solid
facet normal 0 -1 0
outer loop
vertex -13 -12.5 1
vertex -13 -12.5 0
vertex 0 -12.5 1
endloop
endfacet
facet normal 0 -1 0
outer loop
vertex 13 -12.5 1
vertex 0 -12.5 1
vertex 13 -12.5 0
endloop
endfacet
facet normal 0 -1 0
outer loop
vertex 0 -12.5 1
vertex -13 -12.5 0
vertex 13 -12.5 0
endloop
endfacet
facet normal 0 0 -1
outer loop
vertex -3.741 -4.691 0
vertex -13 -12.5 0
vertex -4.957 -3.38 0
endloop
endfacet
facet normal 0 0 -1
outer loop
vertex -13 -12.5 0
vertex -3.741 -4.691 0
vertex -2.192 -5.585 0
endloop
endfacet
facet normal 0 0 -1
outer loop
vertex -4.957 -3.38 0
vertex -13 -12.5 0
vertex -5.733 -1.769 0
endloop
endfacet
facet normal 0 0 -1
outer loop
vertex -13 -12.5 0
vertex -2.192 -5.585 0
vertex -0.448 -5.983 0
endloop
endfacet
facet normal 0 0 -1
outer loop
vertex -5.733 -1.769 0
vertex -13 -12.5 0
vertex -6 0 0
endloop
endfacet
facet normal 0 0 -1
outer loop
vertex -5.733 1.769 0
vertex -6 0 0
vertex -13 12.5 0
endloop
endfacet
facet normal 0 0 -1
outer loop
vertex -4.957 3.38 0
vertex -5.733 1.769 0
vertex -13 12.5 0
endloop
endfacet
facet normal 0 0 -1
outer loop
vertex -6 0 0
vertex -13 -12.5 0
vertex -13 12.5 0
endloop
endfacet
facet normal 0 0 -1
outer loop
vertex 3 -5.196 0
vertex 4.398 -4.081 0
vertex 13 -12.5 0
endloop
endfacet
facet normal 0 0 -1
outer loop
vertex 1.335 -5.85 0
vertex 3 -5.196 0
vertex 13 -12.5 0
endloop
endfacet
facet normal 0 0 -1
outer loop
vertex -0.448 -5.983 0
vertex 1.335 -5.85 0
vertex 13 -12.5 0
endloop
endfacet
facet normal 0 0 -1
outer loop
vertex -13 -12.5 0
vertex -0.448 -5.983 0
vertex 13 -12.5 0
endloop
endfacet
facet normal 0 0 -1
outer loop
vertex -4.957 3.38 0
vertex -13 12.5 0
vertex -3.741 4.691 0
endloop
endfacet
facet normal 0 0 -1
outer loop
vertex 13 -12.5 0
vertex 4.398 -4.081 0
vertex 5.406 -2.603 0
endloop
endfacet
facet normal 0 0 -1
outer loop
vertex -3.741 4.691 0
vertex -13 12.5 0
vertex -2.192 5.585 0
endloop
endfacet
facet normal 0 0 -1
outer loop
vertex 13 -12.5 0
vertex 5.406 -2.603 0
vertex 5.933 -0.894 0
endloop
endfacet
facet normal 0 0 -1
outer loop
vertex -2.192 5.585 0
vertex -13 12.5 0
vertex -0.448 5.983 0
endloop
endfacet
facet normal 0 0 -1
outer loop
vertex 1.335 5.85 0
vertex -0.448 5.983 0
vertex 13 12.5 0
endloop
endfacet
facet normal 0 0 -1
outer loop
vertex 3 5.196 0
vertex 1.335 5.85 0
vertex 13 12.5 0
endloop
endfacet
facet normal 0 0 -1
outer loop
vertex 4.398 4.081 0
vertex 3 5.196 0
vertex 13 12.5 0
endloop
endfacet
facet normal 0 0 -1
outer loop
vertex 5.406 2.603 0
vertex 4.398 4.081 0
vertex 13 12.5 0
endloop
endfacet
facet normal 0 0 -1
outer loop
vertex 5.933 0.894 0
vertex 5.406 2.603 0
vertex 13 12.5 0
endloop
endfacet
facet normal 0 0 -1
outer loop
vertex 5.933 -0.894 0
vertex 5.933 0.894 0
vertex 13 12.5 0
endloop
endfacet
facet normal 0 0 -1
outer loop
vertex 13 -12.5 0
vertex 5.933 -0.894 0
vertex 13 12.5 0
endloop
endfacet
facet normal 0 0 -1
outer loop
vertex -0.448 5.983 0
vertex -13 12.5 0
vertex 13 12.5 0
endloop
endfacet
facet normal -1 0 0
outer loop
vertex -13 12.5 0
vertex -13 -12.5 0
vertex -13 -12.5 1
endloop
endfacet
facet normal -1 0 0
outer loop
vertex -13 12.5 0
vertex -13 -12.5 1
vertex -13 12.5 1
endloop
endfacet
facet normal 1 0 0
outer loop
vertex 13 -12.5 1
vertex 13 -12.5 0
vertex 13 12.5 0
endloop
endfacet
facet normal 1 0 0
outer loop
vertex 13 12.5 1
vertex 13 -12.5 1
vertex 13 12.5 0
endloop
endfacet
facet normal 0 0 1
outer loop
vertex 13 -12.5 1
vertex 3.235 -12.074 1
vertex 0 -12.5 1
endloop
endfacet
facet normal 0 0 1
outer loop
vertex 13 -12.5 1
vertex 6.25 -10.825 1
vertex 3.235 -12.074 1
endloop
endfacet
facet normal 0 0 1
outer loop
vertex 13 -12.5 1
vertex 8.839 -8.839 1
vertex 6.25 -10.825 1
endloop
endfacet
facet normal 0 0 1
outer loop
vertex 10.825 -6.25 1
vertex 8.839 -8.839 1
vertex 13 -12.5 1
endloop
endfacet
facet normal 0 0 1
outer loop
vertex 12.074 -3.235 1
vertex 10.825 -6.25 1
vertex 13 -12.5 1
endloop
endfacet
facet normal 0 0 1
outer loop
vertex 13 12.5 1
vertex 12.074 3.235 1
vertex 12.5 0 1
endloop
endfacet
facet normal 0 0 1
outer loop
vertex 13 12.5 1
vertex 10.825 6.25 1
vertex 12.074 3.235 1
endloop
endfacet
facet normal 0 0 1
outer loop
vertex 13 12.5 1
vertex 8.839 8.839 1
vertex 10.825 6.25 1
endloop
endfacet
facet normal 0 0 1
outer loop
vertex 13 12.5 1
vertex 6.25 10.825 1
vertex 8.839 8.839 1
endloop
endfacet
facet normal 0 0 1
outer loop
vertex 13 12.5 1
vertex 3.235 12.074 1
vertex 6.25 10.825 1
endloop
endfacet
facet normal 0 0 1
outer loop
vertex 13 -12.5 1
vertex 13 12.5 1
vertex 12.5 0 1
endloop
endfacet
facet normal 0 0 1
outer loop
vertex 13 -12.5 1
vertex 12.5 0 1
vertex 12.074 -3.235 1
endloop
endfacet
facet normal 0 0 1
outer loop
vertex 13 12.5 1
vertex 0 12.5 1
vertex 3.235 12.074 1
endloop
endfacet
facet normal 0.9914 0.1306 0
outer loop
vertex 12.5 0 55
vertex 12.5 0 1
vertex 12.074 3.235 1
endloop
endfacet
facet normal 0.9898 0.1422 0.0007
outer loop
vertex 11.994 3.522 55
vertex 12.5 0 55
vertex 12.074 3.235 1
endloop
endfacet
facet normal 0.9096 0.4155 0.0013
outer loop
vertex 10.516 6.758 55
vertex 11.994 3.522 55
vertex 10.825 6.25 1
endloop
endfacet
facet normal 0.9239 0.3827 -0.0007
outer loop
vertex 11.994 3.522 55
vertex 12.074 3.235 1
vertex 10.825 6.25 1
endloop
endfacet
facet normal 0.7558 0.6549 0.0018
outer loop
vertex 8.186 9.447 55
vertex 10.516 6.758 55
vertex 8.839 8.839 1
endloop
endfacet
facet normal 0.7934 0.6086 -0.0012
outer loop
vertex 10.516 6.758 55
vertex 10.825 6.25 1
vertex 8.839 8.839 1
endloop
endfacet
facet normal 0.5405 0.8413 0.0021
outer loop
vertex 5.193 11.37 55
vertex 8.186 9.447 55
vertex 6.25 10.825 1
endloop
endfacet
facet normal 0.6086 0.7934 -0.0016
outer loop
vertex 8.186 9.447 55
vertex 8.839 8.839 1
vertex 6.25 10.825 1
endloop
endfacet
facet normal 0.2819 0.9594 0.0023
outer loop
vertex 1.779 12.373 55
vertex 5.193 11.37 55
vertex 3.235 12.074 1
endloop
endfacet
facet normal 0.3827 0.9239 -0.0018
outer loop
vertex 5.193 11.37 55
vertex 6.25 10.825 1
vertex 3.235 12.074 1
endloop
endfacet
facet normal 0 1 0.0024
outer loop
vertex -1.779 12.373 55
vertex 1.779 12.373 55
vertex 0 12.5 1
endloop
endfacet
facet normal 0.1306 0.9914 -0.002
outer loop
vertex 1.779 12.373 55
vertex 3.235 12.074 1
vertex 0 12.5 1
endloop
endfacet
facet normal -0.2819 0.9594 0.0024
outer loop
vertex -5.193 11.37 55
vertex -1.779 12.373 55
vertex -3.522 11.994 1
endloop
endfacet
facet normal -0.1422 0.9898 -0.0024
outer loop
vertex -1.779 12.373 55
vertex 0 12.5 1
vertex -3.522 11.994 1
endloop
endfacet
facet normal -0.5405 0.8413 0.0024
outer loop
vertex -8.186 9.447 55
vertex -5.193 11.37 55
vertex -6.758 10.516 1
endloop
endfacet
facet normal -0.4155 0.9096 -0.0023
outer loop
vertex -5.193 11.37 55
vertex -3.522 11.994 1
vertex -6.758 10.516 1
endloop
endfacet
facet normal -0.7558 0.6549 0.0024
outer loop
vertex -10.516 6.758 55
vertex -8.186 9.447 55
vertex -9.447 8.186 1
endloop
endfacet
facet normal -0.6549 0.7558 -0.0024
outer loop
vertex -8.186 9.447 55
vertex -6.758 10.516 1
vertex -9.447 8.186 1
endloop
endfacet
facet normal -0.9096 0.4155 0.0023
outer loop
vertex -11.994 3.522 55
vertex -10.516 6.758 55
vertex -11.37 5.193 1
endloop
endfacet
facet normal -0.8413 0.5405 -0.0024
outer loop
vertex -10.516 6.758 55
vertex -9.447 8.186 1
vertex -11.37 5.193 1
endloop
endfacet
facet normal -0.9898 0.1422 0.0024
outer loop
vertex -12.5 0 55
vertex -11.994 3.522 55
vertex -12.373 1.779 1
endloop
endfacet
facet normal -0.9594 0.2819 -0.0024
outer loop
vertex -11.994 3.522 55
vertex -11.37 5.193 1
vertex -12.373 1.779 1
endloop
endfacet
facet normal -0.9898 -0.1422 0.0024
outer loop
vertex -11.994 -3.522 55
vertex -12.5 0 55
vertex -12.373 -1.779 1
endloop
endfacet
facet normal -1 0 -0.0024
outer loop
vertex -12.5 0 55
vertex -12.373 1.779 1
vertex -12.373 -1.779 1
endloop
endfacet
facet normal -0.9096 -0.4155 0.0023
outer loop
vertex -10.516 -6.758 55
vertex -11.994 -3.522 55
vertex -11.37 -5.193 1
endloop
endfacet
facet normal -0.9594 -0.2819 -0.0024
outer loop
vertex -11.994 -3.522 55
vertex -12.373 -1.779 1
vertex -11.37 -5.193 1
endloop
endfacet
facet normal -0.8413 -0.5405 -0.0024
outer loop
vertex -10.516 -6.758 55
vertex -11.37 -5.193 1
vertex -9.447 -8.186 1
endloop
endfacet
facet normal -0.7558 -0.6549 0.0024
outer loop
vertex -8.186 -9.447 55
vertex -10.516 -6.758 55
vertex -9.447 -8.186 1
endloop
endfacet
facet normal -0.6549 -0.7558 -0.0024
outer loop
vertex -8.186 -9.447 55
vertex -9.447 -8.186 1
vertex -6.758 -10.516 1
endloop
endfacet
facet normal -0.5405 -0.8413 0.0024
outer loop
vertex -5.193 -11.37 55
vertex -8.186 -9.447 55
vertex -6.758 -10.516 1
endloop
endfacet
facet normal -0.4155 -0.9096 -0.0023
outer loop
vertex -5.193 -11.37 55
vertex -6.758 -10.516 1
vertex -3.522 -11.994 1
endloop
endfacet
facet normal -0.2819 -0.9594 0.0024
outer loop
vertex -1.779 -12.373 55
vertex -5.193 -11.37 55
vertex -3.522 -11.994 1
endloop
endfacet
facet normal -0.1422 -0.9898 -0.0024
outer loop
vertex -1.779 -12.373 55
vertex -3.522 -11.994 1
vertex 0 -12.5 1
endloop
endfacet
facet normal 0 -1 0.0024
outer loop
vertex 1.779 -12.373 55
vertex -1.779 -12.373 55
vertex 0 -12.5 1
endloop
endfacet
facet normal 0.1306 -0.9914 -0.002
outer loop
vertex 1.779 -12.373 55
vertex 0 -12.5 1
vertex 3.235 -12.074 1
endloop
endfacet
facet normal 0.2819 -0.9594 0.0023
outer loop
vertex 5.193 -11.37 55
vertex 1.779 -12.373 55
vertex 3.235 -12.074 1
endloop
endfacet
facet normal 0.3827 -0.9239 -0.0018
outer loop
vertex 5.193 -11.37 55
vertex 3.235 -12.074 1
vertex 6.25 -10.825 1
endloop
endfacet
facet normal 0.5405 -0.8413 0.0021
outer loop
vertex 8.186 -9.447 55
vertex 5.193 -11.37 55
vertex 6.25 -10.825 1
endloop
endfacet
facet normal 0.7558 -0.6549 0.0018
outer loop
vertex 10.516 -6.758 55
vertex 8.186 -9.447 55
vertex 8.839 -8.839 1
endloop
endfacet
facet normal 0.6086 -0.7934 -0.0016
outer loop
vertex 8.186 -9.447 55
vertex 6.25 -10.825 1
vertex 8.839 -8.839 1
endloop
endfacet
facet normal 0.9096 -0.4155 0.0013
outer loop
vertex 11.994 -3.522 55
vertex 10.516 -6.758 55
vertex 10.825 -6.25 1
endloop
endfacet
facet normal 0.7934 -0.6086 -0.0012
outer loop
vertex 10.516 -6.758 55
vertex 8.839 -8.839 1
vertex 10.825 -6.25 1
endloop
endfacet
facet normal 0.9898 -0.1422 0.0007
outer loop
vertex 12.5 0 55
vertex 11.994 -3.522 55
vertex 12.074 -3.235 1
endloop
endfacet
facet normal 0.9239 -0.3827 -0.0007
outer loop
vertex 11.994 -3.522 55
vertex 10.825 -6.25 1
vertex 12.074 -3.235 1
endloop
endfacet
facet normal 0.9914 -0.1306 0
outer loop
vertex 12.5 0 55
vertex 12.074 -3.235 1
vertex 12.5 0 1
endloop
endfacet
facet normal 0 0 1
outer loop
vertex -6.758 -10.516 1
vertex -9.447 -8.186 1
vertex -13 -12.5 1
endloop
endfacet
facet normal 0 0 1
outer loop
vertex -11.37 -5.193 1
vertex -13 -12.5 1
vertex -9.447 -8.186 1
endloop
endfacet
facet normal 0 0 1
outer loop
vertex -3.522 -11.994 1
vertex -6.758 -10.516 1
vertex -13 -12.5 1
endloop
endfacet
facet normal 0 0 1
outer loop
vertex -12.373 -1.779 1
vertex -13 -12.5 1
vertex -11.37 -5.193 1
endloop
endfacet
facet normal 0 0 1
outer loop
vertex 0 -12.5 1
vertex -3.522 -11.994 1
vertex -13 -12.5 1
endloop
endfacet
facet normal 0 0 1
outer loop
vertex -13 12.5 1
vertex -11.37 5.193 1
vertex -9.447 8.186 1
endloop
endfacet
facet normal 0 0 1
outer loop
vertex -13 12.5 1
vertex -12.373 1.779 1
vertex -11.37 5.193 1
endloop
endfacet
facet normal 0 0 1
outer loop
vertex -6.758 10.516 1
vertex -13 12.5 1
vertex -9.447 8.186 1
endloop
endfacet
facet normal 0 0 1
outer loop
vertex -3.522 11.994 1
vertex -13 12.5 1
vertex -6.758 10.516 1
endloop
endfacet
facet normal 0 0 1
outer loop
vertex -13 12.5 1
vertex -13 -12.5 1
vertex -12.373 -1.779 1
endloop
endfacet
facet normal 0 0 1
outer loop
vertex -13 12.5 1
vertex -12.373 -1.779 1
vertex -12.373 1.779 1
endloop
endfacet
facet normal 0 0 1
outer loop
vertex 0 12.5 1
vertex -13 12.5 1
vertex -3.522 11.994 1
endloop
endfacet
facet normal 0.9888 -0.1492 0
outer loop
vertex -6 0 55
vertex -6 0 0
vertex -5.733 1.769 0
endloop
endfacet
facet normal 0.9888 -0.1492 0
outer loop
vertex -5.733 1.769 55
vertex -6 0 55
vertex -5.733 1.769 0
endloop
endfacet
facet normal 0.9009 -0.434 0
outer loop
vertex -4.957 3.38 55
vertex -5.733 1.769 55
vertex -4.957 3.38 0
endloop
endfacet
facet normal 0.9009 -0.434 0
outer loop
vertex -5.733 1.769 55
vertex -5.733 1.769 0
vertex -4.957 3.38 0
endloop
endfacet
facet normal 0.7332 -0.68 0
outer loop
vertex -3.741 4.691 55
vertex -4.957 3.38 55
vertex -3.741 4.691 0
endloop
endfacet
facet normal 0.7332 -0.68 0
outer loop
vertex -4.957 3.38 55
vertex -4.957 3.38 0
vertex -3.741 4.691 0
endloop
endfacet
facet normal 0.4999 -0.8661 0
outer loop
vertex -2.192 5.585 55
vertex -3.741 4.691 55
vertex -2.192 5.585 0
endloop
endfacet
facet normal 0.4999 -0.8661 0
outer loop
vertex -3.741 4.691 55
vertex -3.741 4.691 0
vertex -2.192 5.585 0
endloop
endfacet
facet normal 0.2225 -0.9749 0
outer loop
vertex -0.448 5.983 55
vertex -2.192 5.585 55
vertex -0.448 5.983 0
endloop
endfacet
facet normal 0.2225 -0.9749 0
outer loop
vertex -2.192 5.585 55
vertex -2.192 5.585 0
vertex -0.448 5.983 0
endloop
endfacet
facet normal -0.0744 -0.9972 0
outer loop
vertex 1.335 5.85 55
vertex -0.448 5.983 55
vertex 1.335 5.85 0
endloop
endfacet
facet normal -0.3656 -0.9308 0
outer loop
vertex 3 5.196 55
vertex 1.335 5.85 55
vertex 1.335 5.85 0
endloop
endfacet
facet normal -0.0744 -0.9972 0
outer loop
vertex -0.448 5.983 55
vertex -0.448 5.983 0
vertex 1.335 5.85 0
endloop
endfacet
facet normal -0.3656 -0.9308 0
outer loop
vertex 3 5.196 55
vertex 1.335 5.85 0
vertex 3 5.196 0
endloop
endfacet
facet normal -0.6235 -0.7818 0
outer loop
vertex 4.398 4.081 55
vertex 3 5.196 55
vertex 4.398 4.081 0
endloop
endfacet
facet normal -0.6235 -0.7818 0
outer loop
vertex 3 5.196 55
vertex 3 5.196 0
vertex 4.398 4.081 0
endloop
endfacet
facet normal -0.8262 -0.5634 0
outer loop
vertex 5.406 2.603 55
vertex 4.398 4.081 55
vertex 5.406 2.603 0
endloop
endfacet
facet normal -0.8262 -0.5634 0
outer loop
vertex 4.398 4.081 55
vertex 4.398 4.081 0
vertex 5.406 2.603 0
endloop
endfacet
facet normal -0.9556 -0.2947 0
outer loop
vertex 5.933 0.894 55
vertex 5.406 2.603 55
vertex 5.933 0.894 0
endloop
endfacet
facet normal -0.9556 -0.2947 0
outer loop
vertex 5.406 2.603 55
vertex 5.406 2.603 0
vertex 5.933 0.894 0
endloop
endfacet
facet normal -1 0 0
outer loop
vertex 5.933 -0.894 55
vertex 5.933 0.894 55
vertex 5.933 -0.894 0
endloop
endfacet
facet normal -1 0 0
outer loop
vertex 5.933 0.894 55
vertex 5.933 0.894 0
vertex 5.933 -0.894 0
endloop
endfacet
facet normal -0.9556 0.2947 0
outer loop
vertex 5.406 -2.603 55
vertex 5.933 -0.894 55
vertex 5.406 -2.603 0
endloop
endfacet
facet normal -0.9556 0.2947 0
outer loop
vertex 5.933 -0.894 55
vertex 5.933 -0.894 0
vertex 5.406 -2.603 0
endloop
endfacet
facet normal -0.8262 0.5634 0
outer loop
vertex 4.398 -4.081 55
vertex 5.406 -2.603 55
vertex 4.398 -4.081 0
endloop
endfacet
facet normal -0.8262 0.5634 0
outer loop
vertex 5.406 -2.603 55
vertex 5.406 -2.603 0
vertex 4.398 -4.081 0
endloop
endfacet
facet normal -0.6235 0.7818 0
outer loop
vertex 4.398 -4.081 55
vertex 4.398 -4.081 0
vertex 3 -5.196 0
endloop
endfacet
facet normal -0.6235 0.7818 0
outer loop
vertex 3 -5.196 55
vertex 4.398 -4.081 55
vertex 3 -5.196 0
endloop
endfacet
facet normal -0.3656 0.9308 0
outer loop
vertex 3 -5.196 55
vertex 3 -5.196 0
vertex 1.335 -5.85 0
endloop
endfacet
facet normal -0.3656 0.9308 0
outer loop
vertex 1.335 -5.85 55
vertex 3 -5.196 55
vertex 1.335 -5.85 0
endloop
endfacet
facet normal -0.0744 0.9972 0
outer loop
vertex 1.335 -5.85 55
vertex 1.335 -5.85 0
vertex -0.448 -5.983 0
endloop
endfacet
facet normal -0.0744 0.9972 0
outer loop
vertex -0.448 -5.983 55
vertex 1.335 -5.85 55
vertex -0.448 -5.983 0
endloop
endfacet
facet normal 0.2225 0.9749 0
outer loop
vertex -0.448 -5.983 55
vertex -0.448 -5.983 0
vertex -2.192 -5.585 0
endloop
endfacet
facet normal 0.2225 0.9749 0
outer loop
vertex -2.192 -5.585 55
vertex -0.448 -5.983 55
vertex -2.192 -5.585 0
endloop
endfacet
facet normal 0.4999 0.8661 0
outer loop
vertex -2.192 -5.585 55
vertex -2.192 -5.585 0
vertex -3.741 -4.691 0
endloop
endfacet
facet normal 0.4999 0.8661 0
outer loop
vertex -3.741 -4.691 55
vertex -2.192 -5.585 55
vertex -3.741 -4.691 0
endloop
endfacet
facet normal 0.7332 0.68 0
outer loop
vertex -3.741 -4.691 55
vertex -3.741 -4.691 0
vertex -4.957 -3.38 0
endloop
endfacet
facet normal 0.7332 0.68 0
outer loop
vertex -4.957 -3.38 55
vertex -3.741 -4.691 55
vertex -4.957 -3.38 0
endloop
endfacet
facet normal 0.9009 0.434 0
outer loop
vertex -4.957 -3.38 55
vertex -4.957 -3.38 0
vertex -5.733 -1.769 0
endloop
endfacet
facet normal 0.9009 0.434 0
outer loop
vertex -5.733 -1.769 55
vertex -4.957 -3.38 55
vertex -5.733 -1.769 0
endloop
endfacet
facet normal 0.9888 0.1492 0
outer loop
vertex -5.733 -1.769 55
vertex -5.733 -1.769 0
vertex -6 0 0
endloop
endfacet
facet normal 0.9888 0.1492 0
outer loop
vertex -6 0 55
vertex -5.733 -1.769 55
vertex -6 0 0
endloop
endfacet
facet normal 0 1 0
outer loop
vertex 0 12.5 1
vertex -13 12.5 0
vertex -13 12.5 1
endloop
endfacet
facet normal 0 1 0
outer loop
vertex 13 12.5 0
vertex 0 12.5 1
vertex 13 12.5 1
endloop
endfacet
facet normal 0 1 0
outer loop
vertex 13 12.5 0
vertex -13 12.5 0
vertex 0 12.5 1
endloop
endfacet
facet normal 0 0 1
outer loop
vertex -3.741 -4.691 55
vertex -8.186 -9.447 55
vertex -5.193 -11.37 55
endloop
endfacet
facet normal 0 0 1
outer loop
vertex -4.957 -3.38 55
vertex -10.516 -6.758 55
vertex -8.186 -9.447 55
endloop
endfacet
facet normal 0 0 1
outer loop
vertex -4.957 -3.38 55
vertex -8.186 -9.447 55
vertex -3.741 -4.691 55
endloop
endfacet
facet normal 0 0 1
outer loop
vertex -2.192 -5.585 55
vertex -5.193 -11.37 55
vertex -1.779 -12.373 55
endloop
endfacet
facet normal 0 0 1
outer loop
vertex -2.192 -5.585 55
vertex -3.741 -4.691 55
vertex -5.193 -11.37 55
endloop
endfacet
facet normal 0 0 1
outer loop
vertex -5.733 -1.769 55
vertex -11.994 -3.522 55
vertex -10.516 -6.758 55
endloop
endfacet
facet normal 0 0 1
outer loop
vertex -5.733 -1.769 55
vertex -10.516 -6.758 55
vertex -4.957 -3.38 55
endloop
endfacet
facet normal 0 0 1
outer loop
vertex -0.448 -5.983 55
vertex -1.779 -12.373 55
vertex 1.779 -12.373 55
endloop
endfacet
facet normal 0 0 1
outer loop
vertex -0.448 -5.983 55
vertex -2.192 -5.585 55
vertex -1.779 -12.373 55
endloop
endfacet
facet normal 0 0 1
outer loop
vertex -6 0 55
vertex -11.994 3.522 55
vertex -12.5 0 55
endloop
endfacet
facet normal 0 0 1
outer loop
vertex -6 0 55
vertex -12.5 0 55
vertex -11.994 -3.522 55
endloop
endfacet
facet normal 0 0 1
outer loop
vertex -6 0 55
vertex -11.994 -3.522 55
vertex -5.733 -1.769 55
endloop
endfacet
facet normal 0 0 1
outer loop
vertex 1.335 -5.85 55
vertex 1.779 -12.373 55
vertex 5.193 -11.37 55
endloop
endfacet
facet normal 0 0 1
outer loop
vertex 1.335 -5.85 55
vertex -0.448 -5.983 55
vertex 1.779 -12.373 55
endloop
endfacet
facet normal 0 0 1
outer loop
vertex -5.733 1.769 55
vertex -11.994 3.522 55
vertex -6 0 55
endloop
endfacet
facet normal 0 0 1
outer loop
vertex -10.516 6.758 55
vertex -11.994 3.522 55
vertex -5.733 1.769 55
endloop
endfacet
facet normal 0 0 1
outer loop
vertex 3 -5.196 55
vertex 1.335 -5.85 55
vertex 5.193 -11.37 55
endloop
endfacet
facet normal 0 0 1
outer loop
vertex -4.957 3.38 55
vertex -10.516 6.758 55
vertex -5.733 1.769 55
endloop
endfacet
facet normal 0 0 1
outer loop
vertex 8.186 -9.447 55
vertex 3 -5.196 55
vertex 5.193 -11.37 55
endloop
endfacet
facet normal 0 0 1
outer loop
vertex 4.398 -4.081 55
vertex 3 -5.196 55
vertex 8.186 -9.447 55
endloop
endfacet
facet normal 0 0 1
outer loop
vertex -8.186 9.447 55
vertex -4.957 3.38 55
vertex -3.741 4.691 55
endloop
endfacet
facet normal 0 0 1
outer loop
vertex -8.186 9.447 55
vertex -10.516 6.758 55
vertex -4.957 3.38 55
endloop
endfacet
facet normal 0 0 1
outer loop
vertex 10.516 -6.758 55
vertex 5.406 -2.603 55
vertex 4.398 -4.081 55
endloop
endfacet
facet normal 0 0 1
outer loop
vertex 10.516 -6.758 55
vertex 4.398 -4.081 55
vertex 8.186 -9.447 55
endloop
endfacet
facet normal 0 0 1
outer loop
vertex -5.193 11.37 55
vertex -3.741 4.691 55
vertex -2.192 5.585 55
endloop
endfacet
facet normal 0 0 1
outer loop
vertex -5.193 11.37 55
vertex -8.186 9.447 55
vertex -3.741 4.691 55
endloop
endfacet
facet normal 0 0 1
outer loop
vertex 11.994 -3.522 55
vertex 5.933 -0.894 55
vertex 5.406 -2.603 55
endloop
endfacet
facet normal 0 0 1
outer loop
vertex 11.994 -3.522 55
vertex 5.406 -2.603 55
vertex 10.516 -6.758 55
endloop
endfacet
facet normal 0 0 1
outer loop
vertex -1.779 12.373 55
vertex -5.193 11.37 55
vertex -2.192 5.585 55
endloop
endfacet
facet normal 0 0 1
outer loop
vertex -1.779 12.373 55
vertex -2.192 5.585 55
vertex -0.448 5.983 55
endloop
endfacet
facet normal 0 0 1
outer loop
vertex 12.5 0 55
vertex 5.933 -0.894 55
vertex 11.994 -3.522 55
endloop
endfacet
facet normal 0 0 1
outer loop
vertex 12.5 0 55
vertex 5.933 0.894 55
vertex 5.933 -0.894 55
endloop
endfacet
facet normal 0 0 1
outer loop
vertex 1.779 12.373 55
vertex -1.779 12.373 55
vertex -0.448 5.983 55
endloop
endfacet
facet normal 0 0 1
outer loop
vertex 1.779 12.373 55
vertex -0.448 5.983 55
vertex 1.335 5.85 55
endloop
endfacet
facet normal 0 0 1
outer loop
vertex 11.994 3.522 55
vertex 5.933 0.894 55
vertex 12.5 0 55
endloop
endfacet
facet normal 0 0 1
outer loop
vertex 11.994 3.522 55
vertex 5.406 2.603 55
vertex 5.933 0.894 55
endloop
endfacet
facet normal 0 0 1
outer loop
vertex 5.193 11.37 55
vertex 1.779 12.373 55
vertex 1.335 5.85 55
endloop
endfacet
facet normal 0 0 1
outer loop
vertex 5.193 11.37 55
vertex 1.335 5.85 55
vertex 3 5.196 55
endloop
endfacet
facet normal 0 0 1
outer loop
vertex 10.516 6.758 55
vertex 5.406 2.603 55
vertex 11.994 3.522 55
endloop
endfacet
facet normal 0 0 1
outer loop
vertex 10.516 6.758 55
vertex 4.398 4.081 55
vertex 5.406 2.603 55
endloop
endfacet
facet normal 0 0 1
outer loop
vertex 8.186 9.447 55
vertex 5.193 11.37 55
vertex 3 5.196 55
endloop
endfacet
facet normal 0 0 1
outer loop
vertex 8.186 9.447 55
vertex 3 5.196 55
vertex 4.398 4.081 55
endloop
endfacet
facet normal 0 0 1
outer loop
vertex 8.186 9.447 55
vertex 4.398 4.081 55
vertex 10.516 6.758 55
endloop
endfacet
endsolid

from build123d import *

# Parameters (mm, degrees)
SKETCH1_W           = 26
SKETCH1_H           = 25
BOSS_EXTRUDE1_DEPTH = 1
SKETCH2_R           = 12.5
BOSS_EXTRUDE2_DEPTH = 54
SKETCH3_R           = 6
CUT_EXTRUDE1_DEPTH  = 56


with BuildPart() as part:
    # Sketch1 → Boss-Extrude1 (new body)
    with BuildSketch(Plane.XY):
        Rectangle(SKETCH1_W, SKETCH1_H)
    extrude(amount=BOSS_EXTRUDE1_DEPTH)

    # Sketch2 → Boss-Extrude2 (add)
    with BuildSketch(Plane.XY.offset(1)):
        Circle(SKETCH2_R)
    extrude(amount=BOSS_EXTRUDE2_DEPTH)

    # Sketch3 → Cut-Extrude1 (cut, through all)
    with BuildSketch(Plane(origin=(0, 0, 0), x_dir=(-1, 0, 0), z_dir=(0, 0, -1))):
        Circle(SKETCH3_R)
    extrude(amount=-CUT_EXTRUDE1_DEPTH, mode=Mode.SUBTRACT)


solid = part.part
